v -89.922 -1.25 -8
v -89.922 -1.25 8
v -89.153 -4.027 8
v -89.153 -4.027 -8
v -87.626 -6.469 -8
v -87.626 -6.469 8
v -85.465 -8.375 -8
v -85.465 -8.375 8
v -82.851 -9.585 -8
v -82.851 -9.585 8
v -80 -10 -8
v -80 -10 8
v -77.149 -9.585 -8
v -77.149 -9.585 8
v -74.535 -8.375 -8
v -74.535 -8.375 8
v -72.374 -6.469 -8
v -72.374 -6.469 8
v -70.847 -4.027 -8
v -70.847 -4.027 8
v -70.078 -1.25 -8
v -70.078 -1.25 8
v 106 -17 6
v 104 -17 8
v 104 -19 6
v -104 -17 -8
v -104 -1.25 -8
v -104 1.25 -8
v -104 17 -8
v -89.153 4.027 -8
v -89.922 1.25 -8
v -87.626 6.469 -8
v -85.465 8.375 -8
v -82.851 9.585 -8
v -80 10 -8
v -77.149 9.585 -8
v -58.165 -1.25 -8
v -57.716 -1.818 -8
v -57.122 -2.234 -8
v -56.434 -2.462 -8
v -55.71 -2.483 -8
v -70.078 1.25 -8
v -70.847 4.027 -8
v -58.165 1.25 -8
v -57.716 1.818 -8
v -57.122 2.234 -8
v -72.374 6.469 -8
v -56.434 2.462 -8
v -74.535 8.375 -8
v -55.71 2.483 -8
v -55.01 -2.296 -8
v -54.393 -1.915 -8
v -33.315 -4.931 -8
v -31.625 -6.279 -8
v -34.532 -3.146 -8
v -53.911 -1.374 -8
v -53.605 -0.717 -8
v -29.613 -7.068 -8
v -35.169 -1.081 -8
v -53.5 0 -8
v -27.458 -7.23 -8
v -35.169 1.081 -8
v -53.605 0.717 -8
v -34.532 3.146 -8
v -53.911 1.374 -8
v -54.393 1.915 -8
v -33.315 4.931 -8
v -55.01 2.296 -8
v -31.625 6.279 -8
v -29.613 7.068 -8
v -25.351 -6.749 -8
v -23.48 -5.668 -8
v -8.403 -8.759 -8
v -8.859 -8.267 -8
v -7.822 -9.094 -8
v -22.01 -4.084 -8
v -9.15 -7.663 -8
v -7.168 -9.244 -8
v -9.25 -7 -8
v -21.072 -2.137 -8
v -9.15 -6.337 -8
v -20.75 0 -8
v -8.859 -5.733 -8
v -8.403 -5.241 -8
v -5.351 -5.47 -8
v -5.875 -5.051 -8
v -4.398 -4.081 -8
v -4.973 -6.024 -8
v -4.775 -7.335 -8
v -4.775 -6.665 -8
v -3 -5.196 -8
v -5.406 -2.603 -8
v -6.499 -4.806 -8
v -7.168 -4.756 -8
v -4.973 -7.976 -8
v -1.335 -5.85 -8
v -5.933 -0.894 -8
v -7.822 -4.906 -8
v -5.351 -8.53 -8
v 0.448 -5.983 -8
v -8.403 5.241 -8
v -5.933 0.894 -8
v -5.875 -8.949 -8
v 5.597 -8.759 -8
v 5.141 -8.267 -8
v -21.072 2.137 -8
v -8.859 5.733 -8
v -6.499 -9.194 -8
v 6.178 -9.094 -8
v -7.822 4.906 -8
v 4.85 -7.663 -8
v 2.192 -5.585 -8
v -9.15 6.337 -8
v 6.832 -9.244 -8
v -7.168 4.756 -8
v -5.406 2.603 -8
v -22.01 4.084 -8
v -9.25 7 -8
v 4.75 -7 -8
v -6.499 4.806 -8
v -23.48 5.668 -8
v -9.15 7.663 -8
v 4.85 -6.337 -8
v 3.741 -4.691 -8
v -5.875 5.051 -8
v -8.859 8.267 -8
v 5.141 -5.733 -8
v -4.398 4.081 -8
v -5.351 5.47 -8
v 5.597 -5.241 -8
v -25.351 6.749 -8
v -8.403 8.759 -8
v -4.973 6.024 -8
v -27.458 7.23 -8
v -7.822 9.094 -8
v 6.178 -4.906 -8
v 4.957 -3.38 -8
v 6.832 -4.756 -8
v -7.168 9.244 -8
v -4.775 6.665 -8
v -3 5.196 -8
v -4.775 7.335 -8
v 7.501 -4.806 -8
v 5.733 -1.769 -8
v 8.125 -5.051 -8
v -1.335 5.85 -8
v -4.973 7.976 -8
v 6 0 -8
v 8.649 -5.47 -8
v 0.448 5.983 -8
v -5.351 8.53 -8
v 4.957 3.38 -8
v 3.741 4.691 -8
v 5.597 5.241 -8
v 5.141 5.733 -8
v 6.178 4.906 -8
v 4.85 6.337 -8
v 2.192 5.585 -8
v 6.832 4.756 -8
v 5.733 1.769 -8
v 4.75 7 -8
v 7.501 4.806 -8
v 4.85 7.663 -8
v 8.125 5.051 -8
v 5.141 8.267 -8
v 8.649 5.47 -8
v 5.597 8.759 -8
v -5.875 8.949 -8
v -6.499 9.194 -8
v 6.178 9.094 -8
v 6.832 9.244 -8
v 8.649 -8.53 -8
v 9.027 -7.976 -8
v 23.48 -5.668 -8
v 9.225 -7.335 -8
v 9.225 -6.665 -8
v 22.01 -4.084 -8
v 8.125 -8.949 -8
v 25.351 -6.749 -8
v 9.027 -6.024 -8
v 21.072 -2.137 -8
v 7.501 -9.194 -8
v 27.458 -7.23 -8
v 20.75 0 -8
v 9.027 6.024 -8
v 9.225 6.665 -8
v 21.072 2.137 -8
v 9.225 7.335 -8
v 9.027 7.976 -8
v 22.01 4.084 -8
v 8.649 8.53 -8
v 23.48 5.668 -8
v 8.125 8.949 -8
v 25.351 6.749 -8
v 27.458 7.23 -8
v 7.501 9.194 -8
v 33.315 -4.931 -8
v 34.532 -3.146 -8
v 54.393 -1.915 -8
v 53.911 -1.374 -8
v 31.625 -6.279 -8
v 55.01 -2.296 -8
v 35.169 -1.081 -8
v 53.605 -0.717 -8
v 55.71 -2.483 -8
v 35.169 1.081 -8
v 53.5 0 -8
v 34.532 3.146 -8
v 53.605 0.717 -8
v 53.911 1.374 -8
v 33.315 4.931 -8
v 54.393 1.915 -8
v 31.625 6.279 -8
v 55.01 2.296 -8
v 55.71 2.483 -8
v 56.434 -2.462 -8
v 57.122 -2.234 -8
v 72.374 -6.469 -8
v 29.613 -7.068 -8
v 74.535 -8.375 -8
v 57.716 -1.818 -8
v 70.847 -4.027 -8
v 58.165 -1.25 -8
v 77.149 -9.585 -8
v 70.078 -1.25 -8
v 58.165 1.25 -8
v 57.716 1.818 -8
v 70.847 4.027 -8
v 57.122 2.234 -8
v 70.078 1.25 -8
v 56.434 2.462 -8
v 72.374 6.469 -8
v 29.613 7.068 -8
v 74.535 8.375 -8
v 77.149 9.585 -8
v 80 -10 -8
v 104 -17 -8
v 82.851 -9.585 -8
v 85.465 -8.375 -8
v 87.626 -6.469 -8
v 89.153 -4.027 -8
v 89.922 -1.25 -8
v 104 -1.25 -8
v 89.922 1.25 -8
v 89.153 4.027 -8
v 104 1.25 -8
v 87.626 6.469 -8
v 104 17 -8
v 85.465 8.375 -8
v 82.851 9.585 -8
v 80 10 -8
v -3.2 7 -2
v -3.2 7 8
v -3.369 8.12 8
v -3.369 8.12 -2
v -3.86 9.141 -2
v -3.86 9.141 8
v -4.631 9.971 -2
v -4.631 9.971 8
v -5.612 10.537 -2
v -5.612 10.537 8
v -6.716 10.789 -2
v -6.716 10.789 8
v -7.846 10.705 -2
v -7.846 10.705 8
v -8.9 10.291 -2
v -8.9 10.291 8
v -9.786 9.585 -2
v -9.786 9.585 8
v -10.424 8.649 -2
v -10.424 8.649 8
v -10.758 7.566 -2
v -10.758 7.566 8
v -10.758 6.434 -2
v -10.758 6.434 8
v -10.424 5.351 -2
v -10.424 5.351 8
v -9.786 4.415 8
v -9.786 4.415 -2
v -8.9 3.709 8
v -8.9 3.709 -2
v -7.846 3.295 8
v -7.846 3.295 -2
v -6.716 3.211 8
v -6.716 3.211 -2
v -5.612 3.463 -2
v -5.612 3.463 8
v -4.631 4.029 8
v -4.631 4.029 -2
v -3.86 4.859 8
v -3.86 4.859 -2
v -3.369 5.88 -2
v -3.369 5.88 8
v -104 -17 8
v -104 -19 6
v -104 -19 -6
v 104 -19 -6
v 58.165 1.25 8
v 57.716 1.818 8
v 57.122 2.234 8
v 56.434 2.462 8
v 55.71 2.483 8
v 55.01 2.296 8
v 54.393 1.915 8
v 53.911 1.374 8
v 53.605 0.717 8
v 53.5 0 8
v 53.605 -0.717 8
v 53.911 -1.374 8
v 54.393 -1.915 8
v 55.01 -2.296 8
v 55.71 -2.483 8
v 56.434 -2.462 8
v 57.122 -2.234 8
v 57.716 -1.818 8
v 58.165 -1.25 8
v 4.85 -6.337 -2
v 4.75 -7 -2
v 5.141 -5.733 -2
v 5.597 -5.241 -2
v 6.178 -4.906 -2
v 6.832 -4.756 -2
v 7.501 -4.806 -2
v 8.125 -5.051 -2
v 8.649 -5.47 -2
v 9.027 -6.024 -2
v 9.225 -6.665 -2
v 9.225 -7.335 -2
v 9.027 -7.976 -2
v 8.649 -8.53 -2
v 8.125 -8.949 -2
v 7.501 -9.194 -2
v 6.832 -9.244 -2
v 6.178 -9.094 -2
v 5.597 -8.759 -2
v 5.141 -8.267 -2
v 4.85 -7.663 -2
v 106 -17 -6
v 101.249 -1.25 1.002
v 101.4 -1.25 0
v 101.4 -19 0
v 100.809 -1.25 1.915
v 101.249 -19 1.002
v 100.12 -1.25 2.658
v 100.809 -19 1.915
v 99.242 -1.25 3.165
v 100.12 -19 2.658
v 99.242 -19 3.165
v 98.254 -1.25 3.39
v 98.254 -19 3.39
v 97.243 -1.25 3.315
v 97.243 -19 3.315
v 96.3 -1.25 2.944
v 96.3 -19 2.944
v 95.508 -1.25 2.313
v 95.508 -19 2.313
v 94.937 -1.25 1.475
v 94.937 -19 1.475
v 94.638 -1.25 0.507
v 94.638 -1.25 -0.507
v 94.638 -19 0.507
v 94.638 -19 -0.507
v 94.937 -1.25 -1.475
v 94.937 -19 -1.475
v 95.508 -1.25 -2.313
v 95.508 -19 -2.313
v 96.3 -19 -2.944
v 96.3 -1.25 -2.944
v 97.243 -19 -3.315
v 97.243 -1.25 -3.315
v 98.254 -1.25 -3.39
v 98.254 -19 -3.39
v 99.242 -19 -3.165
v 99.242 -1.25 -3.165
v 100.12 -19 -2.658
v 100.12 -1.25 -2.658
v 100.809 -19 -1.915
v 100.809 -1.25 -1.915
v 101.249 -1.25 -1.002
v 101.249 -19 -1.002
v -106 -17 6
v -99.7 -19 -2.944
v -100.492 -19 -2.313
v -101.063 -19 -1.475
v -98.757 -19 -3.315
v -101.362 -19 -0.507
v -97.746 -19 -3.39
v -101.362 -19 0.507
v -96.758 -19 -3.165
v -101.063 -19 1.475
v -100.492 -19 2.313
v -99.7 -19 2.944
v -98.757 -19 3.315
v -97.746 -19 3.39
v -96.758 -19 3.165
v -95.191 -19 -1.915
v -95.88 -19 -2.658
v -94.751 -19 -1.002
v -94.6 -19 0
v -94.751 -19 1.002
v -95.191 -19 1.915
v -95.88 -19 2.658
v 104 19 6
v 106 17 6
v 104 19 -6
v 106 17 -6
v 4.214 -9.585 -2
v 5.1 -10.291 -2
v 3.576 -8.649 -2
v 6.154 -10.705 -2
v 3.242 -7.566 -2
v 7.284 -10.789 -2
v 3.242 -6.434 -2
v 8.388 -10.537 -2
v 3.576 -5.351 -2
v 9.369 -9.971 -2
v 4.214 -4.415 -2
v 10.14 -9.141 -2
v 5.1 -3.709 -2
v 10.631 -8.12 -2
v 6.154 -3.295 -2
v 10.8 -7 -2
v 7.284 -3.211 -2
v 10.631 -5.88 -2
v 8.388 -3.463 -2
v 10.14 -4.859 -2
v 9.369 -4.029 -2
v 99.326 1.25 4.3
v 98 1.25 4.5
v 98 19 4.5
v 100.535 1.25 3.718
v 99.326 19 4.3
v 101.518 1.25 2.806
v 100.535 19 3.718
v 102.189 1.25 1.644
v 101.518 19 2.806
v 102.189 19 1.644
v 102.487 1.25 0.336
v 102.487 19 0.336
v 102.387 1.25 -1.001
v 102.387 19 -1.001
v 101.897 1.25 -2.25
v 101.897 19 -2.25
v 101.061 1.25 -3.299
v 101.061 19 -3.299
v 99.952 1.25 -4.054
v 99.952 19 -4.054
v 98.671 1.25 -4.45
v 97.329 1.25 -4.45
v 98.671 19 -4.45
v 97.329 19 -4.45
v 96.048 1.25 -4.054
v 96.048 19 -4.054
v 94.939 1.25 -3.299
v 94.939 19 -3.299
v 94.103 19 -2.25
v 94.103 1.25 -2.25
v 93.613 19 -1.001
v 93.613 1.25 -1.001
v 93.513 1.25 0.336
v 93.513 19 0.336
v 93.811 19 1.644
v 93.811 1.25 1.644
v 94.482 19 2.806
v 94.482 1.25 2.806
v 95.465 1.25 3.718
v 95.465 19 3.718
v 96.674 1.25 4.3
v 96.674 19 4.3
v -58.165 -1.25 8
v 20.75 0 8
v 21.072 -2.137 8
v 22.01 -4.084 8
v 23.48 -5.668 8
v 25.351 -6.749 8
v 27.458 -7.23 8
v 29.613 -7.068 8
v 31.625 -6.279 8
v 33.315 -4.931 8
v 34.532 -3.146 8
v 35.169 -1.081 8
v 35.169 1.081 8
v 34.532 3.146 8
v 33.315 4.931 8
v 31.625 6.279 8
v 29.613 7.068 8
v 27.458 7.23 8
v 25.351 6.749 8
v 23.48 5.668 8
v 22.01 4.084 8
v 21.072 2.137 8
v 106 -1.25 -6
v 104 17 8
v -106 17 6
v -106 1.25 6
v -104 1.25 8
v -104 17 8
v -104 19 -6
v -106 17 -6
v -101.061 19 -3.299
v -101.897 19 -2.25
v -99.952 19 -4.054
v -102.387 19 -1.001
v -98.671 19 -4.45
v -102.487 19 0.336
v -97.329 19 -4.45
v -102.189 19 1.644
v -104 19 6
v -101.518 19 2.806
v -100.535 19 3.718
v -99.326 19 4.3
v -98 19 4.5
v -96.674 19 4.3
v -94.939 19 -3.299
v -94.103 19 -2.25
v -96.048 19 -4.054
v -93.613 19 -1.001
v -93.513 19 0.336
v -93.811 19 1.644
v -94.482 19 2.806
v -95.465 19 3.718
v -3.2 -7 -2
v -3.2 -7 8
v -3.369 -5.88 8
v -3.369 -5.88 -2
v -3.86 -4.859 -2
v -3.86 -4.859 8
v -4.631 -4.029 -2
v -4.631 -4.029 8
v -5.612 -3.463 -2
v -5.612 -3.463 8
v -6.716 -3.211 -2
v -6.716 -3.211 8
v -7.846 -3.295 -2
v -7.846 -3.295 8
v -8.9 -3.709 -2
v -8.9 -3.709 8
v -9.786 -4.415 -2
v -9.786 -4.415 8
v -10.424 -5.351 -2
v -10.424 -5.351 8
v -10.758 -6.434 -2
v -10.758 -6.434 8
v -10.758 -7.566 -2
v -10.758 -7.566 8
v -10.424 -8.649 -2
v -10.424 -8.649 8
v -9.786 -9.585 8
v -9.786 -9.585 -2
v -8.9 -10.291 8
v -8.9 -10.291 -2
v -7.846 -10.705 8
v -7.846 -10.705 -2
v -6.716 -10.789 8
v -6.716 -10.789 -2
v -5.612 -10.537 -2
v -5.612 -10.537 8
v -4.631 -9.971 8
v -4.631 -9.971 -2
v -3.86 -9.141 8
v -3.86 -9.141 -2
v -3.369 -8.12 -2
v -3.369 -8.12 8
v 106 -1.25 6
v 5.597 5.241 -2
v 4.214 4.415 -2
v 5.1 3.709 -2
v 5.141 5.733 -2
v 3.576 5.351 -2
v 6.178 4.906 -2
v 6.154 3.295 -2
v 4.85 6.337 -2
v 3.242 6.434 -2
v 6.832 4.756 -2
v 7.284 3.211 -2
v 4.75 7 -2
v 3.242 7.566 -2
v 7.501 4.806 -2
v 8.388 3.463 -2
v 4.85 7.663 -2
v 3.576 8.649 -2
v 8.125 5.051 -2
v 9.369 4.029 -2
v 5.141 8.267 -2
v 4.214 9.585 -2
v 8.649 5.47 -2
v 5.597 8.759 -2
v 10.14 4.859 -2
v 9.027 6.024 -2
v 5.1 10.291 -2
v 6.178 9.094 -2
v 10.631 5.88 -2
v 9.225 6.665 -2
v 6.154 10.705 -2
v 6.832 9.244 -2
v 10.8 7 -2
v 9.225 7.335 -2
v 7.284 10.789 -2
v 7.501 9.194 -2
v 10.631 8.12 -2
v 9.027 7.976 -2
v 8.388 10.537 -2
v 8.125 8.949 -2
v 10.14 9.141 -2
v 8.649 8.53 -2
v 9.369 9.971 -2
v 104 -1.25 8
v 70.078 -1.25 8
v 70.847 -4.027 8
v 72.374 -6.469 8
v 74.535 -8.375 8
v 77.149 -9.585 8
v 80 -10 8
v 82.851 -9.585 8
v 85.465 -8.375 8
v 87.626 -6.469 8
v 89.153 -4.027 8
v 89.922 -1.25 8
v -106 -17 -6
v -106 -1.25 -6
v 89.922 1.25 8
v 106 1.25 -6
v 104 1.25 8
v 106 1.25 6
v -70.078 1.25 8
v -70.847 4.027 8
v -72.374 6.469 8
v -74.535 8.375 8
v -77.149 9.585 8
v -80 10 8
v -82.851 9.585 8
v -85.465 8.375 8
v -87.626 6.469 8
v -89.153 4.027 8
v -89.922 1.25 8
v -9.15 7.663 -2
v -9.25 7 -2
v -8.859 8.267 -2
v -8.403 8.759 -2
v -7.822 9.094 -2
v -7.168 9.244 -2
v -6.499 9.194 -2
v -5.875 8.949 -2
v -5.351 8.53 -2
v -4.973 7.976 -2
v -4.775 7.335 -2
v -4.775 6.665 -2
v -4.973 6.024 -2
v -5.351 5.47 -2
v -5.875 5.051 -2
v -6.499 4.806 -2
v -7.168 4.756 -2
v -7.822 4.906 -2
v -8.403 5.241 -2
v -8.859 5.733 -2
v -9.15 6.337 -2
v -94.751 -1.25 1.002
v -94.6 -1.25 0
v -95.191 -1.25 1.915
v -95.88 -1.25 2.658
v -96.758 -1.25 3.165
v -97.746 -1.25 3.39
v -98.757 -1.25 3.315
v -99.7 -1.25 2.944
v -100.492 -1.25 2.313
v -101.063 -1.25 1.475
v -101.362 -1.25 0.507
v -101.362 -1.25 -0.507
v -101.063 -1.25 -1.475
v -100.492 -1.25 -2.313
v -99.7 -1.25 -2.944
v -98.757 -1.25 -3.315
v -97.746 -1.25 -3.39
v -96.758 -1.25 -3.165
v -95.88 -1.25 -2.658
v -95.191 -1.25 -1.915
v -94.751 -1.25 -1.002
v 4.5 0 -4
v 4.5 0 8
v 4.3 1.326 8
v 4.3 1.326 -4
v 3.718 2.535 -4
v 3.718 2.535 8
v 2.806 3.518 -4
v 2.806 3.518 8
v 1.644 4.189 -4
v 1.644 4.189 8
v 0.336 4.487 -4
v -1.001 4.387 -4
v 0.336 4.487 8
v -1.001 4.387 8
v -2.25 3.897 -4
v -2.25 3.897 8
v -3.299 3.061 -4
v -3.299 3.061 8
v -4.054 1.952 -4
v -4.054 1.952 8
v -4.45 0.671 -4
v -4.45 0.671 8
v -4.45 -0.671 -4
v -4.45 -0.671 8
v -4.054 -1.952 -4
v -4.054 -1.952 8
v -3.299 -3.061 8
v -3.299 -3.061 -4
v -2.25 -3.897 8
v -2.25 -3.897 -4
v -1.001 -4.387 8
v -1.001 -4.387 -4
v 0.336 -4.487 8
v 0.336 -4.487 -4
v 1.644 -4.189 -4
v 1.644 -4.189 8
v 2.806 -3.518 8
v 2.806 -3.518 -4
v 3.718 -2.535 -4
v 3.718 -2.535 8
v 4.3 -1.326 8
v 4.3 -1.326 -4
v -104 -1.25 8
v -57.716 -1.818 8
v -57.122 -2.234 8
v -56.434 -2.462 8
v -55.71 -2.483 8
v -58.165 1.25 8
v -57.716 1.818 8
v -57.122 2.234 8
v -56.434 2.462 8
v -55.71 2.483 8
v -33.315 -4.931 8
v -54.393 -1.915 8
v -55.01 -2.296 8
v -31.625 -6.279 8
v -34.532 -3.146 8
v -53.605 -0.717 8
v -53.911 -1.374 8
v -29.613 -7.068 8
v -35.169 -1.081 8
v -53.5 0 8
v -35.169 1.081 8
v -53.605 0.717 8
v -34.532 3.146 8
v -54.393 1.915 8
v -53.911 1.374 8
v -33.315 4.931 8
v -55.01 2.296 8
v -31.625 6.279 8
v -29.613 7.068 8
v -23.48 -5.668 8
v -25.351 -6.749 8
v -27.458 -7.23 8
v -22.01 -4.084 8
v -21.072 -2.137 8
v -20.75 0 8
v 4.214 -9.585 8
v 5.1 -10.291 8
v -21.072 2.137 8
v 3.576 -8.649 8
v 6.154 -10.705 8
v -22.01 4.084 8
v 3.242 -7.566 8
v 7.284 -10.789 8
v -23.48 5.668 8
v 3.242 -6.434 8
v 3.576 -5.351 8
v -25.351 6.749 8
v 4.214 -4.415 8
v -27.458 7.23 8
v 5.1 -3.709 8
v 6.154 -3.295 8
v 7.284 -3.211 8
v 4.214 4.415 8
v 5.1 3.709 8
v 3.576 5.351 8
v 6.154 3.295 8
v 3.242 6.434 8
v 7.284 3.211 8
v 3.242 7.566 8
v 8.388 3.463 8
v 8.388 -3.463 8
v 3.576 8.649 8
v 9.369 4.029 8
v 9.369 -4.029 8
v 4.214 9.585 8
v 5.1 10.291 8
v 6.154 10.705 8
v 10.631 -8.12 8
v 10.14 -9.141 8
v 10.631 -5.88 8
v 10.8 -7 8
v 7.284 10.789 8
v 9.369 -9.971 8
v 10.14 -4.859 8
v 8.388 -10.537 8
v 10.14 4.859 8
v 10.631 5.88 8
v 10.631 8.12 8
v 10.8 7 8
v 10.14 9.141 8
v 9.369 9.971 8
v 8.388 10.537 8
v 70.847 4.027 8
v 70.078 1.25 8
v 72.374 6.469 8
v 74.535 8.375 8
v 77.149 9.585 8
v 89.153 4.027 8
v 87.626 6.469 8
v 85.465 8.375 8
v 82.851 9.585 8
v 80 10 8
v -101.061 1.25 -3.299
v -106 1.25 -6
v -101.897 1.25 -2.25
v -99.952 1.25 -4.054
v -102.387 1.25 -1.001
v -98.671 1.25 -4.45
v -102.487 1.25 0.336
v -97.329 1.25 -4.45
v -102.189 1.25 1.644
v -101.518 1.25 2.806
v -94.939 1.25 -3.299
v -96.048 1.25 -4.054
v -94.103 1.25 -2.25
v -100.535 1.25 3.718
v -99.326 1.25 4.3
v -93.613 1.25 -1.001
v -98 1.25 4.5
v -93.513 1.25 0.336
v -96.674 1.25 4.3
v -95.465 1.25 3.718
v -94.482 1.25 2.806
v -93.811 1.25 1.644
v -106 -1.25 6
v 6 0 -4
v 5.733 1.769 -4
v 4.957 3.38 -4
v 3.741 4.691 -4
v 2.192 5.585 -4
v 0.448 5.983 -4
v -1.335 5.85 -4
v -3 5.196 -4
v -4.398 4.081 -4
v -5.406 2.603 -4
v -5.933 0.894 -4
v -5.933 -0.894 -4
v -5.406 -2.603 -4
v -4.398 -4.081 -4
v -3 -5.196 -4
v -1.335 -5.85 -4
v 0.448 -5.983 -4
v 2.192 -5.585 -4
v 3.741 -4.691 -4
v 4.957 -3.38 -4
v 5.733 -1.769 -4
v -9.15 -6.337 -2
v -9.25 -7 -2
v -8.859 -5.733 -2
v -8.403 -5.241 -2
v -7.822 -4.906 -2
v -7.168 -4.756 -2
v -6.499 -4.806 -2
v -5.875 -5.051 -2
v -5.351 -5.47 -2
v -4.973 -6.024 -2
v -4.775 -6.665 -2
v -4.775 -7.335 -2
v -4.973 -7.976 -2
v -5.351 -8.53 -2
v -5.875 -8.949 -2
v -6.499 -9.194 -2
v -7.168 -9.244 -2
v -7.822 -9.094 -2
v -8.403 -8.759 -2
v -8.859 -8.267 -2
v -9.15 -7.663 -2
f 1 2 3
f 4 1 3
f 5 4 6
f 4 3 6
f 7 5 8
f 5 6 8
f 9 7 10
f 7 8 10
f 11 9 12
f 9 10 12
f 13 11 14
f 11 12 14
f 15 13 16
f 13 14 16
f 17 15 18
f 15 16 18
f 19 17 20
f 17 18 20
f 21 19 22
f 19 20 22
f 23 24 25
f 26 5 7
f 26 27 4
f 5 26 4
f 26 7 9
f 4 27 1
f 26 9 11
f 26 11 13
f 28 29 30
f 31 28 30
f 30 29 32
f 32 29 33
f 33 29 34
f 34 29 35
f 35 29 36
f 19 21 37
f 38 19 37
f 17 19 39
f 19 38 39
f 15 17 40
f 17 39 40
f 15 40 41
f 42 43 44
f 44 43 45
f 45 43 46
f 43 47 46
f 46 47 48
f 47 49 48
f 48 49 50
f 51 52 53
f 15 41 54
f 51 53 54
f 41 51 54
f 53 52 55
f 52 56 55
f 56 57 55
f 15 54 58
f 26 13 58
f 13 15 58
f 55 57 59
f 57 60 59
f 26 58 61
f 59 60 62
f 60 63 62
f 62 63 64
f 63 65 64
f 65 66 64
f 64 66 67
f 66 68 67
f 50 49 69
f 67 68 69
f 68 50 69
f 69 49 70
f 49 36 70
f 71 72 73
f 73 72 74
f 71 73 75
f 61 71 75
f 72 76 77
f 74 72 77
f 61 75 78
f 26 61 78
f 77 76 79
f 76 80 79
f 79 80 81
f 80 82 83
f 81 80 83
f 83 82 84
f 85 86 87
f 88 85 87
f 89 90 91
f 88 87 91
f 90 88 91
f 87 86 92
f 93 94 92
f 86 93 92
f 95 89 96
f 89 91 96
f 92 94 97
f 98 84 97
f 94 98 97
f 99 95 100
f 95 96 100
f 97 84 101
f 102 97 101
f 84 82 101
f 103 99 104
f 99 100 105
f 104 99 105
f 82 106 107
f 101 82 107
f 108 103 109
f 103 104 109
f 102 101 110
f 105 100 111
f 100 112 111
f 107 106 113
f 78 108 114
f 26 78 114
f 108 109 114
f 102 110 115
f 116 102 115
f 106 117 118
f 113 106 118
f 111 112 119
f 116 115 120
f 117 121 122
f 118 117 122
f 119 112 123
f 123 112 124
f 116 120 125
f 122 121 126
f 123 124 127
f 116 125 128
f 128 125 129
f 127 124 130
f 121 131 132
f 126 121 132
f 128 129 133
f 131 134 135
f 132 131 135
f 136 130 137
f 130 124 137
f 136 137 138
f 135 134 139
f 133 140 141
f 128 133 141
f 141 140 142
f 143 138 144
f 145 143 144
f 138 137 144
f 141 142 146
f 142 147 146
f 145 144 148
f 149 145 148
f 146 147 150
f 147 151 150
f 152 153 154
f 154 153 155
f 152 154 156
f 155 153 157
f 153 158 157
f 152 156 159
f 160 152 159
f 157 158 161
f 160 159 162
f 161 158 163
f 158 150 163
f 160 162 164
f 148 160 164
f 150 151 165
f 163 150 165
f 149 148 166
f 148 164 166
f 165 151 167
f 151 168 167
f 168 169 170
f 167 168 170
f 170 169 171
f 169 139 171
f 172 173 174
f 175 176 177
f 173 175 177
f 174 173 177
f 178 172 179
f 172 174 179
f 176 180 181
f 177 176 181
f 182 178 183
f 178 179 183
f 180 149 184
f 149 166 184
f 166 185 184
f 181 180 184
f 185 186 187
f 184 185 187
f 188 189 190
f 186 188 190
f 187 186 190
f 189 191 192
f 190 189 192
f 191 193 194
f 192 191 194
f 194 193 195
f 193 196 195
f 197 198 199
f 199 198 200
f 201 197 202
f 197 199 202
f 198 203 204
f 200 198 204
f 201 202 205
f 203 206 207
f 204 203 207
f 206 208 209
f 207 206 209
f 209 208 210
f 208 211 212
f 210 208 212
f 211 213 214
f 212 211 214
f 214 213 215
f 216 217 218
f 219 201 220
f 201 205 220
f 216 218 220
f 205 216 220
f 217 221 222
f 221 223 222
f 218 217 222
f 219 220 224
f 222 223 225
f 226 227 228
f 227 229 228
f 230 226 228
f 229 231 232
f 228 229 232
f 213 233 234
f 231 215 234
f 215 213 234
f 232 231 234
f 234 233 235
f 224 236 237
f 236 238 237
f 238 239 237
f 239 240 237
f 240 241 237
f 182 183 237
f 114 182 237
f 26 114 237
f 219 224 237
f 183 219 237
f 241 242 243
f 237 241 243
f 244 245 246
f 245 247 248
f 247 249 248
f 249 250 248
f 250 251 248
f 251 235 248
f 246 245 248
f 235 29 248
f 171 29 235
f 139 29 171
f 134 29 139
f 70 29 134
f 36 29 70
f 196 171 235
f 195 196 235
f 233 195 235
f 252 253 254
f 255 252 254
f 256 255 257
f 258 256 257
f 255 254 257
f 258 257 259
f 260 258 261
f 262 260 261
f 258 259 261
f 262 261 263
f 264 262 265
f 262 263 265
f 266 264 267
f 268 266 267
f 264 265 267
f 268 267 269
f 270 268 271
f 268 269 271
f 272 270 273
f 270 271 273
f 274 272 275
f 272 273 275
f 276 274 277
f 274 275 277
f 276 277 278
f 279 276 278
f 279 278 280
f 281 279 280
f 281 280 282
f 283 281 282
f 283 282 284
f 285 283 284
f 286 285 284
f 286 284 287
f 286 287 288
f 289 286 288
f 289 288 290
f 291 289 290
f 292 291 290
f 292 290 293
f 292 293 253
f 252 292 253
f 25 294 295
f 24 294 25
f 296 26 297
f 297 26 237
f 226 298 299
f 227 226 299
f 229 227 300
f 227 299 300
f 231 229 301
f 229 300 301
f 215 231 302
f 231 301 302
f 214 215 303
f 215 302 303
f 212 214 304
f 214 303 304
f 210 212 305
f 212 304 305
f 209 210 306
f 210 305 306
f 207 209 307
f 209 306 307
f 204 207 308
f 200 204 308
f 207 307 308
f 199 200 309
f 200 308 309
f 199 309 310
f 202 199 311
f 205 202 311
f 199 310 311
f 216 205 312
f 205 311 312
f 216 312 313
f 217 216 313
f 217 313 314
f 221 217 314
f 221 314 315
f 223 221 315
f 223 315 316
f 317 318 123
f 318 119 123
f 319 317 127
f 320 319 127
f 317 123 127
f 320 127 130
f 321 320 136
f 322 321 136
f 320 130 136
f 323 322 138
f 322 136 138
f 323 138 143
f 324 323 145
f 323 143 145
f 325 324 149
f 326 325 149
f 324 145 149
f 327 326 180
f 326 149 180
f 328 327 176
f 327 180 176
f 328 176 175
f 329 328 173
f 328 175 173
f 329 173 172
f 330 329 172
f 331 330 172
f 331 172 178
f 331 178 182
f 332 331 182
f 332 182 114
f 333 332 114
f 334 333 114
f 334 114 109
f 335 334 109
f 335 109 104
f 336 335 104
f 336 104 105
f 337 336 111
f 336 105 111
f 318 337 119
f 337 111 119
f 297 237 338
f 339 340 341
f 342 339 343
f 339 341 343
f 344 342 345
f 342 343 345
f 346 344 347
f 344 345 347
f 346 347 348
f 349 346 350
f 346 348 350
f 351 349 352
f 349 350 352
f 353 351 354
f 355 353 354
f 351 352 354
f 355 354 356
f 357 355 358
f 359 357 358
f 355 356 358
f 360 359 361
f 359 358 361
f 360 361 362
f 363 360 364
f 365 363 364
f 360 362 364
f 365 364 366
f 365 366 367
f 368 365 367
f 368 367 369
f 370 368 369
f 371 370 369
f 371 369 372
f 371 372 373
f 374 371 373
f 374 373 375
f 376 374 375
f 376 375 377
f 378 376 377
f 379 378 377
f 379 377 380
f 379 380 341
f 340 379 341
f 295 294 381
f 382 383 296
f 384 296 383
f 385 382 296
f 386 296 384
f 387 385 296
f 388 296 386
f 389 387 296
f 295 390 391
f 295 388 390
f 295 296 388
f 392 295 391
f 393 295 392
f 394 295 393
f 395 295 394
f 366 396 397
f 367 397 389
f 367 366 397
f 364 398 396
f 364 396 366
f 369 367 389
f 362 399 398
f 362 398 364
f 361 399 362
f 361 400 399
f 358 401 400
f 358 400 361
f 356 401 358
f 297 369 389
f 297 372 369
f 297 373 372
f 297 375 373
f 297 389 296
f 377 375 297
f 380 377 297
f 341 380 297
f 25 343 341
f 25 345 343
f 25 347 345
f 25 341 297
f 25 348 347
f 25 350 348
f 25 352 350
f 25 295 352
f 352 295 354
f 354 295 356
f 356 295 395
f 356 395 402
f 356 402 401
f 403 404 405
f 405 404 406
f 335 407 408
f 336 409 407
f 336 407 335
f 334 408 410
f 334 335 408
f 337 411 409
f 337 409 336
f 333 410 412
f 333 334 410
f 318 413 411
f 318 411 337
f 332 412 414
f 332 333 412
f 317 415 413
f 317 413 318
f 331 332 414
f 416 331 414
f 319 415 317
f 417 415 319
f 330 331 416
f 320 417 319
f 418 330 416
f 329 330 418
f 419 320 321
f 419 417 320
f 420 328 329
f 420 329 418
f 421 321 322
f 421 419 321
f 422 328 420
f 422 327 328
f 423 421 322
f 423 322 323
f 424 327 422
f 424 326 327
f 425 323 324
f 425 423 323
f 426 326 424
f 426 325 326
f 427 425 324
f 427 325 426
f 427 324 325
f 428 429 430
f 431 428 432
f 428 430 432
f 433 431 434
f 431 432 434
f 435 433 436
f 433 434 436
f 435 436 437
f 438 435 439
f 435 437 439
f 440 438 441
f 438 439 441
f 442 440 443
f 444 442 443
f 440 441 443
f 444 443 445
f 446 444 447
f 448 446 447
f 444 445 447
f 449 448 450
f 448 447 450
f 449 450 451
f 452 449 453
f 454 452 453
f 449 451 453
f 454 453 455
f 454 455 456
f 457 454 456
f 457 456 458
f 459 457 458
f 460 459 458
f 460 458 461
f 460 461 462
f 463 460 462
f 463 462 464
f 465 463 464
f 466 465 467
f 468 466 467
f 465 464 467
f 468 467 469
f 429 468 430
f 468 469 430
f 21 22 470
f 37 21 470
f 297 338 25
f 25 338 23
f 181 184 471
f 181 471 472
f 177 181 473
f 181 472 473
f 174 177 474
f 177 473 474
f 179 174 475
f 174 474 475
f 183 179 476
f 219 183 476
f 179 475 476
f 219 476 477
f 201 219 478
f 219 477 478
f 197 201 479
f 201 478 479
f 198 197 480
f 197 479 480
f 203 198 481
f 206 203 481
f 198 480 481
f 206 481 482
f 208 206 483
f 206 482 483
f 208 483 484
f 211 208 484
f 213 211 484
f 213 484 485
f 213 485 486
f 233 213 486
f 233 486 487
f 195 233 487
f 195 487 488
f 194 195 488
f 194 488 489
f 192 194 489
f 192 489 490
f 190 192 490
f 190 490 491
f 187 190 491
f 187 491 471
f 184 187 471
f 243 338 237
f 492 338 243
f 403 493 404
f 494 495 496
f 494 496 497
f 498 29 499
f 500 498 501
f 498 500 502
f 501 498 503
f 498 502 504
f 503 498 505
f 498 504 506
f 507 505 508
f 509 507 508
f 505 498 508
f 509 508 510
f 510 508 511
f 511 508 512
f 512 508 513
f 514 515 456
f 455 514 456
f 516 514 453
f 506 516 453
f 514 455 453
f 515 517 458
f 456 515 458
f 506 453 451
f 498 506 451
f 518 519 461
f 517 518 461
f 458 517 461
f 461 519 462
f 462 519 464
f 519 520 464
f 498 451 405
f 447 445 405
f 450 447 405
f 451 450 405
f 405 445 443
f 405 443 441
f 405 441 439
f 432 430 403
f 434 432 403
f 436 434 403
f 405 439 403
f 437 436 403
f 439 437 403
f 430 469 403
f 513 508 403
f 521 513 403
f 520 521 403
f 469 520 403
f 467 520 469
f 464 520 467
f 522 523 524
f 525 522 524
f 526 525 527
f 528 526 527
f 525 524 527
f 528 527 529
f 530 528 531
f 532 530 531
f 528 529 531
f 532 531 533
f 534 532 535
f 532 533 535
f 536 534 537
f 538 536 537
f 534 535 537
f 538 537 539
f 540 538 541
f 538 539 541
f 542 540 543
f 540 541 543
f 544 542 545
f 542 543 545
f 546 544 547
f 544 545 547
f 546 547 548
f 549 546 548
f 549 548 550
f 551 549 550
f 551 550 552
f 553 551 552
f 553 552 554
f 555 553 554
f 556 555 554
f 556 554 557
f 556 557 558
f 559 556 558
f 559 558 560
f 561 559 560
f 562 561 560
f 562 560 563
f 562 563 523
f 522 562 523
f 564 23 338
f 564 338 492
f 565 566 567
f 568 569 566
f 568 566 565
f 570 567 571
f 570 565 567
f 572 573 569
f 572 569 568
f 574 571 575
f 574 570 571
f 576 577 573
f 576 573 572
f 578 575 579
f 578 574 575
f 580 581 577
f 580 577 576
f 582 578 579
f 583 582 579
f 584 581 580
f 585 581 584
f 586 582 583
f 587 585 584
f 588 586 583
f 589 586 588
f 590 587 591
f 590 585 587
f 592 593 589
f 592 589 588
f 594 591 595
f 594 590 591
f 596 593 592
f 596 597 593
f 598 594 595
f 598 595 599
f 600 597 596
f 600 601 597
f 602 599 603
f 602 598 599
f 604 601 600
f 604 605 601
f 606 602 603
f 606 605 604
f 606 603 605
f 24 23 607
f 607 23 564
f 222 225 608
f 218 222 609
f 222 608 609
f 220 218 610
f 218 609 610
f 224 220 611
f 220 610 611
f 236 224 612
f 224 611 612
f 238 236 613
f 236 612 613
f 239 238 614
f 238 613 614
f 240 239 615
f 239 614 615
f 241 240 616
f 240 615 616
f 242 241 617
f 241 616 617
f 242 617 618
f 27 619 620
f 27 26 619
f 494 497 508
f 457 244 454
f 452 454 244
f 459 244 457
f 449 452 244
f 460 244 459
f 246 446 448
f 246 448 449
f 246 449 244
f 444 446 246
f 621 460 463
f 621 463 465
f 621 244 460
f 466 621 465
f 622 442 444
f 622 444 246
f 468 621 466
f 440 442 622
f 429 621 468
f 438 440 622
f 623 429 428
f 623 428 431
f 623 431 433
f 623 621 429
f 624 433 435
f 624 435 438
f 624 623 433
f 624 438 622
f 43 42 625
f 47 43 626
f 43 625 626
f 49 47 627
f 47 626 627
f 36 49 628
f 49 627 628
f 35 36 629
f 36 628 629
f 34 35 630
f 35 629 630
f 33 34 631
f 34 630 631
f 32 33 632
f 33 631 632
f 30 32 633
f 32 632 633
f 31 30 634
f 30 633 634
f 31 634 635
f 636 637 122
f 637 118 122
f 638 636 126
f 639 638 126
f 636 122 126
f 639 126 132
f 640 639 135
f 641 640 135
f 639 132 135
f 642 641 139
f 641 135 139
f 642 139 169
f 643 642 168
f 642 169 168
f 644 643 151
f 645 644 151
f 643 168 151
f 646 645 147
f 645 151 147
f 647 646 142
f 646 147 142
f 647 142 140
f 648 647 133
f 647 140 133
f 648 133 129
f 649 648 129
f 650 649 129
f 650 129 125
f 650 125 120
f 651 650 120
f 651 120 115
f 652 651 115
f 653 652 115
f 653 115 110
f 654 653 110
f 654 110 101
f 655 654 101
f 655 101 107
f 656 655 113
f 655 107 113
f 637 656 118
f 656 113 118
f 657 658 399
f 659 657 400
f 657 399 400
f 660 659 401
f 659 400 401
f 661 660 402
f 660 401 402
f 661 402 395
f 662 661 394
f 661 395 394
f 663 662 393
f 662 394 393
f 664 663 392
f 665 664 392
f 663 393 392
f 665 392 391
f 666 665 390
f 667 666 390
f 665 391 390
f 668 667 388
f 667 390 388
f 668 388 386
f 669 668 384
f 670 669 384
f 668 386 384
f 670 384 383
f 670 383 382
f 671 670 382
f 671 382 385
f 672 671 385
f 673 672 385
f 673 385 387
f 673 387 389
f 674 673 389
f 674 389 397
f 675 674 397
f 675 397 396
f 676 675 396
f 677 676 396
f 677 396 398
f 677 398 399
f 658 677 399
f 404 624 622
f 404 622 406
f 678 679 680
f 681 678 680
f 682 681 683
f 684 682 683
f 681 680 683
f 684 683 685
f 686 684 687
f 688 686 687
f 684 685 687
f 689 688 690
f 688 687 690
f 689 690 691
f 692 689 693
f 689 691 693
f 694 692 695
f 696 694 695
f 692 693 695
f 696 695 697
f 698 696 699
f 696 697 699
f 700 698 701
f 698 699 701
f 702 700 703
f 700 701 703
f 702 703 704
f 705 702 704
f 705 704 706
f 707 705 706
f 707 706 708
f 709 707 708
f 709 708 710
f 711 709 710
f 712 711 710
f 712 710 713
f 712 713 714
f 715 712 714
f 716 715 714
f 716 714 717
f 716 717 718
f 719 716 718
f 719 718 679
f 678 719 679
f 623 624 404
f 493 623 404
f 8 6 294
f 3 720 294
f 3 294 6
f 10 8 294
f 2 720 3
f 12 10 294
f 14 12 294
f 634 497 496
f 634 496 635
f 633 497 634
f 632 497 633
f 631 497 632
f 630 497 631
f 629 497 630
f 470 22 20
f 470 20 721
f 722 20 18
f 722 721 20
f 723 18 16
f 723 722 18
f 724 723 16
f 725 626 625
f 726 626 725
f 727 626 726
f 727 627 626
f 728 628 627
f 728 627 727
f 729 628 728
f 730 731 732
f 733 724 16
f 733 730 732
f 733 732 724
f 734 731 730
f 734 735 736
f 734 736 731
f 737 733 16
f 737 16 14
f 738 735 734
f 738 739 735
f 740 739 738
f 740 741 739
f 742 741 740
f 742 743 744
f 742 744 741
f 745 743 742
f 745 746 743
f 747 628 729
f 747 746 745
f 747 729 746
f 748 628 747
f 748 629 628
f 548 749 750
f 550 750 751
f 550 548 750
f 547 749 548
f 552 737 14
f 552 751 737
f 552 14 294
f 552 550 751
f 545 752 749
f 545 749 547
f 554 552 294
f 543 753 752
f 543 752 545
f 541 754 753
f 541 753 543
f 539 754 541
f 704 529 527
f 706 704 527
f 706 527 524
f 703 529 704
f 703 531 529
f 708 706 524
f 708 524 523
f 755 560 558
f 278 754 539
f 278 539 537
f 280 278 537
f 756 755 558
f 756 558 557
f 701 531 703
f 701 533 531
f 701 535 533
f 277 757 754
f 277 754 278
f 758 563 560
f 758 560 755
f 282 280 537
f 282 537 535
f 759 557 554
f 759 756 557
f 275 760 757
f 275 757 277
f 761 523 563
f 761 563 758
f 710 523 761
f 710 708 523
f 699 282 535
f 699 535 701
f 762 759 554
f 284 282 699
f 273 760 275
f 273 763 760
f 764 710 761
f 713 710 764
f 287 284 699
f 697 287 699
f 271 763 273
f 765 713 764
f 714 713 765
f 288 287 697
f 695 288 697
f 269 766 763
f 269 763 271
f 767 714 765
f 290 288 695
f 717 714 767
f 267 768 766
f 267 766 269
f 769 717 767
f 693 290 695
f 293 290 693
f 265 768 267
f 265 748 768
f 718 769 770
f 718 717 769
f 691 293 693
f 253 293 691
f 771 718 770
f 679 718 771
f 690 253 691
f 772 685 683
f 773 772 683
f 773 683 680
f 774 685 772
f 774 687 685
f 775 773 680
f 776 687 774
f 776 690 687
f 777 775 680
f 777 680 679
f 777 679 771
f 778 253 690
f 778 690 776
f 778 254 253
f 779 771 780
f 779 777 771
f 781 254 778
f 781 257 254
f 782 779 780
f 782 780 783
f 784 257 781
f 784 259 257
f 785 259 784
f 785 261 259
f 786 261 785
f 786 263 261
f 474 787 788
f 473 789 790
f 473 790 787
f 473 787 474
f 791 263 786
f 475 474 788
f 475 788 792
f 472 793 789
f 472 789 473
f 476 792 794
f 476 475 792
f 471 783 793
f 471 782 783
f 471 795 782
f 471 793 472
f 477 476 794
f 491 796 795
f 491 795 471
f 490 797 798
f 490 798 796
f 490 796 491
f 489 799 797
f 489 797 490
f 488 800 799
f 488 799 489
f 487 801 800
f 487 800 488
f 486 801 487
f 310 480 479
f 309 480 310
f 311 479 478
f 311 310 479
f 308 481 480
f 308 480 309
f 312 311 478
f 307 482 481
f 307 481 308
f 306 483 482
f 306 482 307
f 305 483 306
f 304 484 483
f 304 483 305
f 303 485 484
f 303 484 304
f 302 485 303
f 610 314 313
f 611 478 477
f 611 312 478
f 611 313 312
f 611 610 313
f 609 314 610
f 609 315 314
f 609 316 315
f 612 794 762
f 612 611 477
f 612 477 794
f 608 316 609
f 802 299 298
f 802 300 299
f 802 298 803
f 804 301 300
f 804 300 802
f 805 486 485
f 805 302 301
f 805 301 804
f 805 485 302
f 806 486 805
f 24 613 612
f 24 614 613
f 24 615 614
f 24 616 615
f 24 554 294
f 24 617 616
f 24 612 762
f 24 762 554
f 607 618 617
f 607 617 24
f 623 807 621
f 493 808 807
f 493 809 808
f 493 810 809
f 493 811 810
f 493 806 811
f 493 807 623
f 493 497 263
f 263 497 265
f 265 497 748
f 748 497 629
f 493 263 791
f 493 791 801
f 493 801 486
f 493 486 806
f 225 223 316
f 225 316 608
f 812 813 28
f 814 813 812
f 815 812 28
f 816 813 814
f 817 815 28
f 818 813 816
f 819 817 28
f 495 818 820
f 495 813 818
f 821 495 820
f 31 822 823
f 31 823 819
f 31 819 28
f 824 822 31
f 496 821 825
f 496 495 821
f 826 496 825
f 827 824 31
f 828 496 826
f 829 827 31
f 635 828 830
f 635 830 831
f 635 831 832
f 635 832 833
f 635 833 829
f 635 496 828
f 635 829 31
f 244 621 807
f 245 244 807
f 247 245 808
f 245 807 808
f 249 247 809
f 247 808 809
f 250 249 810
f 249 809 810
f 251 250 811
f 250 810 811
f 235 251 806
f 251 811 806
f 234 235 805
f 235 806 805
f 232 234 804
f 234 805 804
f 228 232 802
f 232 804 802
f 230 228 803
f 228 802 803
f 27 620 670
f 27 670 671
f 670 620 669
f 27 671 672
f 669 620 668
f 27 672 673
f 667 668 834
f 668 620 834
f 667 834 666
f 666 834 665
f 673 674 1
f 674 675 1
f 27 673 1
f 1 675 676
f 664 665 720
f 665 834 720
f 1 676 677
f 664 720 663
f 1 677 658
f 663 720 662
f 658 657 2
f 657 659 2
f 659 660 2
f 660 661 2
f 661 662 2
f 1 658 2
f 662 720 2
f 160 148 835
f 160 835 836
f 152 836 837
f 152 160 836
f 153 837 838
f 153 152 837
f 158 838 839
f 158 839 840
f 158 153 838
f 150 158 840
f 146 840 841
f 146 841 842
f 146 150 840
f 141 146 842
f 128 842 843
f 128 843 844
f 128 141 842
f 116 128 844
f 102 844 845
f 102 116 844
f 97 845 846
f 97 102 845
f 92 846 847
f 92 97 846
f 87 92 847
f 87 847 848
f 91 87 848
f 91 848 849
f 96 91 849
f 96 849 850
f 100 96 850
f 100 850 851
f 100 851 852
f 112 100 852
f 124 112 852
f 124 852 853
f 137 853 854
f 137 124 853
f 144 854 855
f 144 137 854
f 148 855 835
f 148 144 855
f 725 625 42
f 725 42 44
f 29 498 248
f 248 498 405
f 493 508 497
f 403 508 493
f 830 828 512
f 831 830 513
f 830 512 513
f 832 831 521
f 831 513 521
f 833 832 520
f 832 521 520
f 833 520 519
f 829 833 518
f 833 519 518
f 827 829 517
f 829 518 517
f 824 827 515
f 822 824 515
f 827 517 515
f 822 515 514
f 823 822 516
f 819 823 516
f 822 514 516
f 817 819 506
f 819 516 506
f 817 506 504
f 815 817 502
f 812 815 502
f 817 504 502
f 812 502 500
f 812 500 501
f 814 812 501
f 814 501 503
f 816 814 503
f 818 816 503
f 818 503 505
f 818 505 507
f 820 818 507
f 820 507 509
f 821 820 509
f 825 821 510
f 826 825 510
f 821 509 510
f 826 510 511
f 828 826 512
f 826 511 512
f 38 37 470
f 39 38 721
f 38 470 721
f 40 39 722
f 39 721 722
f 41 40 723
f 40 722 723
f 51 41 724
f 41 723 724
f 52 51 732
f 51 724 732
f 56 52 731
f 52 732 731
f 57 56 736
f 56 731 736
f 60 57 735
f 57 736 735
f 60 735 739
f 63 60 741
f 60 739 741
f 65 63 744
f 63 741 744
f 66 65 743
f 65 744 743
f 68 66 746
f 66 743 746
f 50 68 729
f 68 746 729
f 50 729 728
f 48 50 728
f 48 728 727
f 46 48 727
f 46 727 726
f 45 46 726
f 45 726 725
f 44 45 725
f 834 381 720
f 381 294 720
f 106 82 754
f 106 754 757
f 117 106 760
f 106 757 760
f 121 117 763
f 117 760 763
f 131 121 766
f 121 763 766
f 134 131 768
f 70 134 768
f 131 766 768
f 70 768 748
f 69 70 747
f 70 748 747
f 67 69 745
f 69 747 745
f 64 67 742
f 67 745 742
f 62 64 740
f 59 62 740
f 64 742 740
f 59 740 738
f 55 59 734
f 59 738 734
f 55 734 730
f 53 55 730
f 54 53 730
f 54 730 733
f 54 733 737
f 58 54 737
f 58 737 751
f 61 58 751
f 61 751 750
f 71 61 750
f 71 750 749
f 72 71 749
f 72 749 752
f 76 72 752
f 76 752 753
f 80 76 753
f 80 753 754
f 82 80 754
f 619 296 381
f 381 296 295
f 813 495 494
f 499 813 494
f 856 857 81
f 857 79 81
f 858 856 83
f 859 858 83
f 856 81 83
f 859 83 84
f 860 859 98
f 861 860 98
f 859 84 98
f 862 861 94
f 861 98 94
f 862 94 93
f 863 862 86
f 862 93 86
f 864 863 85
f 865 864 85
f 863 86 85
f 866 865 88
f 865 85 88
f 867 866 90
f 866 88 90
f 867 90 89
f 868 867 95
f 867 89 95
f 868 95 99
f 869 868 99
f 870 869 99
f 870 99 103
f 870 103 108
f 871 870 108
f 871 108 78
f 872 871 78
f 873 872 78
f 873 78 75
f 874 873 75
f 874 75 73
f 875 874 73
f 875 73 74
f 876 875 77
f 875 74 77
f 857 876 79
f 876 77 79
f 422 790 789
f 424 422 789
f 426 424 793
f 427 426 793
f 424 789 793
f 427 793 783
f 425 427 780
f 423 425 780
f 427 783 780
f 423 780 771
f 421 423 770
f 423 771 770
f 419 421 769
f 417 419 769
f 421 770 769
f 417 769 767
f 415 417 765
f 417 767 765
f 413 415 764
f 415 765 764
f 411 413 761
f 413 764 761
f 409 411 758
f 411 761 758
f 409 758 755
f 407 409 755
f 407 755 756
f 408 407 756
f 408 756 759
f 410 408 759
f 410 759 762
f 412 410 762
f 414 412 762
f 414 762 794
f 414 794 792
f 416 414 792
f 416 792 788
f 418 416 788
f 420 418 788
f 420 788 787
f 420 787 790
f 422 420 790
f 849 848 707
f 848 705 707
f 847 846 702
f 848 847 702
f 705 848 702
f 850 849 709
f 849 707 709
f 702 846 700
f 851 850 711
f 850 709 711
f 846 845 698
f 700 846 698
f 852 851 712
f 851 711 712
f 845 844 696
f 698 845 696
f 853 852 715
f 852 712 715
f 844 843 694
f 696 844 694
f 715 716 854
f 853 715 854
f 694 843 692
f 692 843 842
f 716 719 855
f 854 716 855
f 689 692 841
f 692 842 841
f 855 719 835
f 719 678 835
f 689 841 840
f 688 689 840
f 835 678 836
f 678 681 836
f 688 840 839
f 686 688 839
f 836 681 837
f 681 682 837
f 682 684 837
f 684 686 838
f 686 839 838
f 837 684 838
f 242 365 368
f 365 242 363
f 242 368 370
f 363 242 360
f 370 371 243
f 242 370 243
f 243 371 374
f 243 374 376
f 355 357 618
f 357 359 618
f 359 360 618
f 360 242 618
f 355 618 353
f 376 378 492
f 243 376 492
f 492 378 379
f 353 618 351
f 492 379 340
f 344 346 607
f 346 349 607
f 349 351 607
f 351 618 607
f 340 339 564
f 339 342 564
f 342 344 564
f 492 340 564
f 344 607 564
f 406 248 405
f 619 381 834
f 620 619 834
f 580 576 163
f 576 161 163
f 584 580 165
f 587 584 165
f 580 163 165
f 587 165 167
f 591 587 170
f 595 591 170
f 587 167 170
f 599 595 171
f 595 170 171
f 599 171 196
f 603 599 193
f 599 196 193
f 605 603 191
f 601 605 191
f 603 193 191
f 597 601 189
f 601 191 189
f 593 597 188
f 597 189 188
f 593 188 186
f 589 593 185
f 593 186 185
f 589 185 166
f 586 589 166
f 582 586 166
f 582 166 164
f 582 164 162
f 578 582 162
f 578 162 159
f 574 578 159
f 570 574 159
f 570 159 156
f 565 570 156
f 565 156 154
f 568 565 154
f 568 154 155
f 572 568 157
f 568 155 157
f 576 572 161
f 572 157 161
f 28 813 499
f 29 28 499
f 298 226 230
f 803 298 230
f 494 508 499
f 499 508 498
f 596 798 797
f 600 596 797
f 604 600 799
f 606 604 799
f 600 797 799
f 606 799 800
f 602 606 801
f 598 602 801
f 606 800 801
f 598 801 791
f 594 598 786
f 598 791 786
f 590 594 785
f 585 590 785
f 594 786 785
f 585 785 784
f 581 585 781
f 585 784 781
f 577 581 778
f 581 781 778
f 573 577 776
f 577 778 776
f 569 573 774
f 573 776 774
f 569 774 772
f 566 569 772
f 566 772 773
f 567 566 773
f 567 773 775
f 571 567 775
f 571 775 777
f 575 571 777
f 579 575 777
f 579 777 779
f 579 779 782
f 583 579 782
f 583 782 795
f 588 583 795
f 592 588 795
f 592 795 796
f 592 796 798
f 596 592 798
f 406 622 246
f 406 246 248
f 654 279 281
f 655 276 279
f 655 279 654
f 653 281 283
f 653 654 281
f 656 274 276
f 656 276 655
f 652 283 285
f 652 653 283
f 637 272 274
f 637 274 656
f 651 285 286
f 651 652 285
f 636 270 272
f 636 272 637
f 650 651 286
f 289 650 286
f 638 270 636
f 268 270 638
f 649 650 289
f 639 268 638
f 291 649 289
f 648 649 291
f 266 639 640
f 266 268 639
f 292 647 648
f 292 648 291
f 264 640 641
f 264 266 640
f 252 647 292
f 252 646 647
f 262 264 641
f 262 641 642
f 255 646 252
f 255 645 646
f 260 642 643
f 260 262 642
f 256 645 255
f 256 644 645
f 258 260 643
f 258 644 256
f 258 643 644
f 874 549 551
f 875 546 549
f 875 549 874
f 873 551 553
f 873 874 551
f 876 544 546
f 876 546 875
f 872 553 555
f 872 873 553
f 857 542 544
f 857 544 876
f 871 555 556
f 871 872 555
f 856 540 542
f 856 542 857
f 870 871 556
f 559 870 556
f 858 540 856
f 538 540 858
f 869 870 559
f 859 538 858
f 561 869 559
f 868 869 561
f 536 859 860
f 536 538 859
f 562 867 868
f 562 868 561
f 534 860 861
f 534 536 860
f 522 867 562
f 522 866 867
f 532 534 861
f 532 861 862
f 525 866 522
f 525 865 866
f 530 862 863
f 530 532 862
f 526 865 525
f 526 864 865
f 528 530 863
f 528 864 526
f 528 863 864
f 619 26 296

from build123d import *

# Parameters (mm, degrees)
SKETCH_1_W                = 212
SKETCH_1_H                = 38
EXTRUDE_1_DEPTH           = 8
SKETCH_2_R                = 10
CUT_EXTRUDE_1_DEPTH       = 109.87148387
SKETCH_3_W                = 50
SKETCH_3_H                = 2.5
CUT_EXTRUDE_2_DEPTH       = 109.87148387
SKETCH_4_R                = 6
CUT_EXTRUDE_3_DEPTH       = 4
SKETCH_5_R                = 4.5
CUT_EXTRUDE_4_DEPTH       = 109.87148387
HOLE_WIZARD_1_D           = 4.5
HOLE_WIZARD_1_CBORE_D     = 7.6
HOLE_WIZARD_1_CBORE_DEPTH = 10
SKETCH_8_R                = 7.25
CUT_EXTRUDE_5_DEPTH       = 109.87148387
SKETCH_9_R                = 4.5
CUT_EXTRUDE_6_DEPTH       = 17.75
M8X1_25_1_D               = 6.8
CHAMFER_1_SIZE            = 2
SKETCH_13_R               = 2.5
CUT_EXTRUDE_7_DEPTH       = 109.87148387


with BuildPart() as part:
    # 草图1 → 凸台-拉伸1 (new, symmetric)
    with BuildSketch(Plane.XY):
        Rectangle(SKETCH_1_W, SKETCH_1_H)
    extrude(amount=EXTRUDE_1_DEPTH, both=True)

    # 草图2 → 切除-拉伸1 (cut, through all)
    with BuildSketch(Plane.XY.offset(8)):
        with Locations((-80, 0)):
            Circle(SKETCH_2_R)
        with Locations(Location((80, 0, 0), (0, 0, 180))):
            Circle(SKETCH_2_R)
    extrude(amount=-CUT_EXTRUDE_1_DEPTH, mode=Mode.SUBTRACT)

    # 草图3 → 切除-拉伸2 (cut, through all)
    with BuildSketch(Plane.XY.offset(8)):
        with Locations((-81, 0)):
            Rectangle(SKETCH_3_W, SKETCH_3_H)
        with Locations((81, 0)):
            Rectangle(SKETCH_3_W, SKETCH_3_H)
    extrude(amount=-CUT_EXTRUDE_2_DEPTH, mode=Mode.SUBTRACT)

    # 草图4 → 切除-拉伸3 (cut)
    with BuildSketch(Plane.XY.offset(-8)):
        Circle(SKETCH_4_R)
    extrude(amount=CUT_EXTRUDE_3_DEPTH, mode=Mode.SUBTRACT)

    # 草图5 → 切除-拉伸4 (cut, through all)
    with BuildSketch(Plane.XY.offset(8)):
        Circle(SKETCH_5_R)
    extrude(amount=-CUT_EXTRUDE_4_DEPTH, mode=Mode.SUBTRACT)

    # 孔1 (through all)
    with Locations(Plane.XY.offset(8)):
        with Locations((-7, 7), (7, 7), (7, -7), (-7, -7)):
            CounterBoreHole(HOLE_WIZARD_1_D / 2, HOLE_WIZARD_1_CBORE_D / 2, HOLE_WIZARD_1_CBORE_DEPTH)

    # 草图8 → 切除-拉伸5 (cut, through all)
    with BuildSketch(Plane.XY.offset(8)):
        with Locations((-28, 0)):
            Circle(SKETCH_8_R)
        with Locations(Location((28, 0, 0), (0, 0, 180))):
            Circle(SKETCH_8_R)
    extrude(amount=-CUT_EXTRUDE_5_DEPTH, mode=Mode.SUBTRACT)

    # 草图9 → 切除-拉伸6 (cut)
    with BuildSketch(Plane(origin=(0, 19, 0), x_dir=(1, 0, 0), z_dir=(0, 1, 0))):
        with Locations(Location((-98, 0, 0), (0, 0, 270))):
            Circle(SKETCH_9_R)
        with Locations(Location((98, 0, 0), (0, 0, 270))):
            Circle(SKETCH_9_R)
    extrude(amount=-CUT_EXTRUDE_6_DEPTH, mode=Mode.SUBTRACT)

    # M8x1.25 螺纹孔1 (through all)
    with Locations(Plane(origin=(0, -1.25, 0), x_dir=(-1, 0, 0), z_dir=(0, 1, 0))):
        with Locations((98, 0), (-98, 0)):
            Hole(M8X1_25_1_D / 2)

    # 倒角1
    chamfer_1_edges = [part.edges().sort_by_distance(p)[0] for p in [
        (106, -10.125, 8),
        (0, 19, 8),
        (-106, -10.125, -8),
        (-106, -10.125, 8),
        (-106, 10.125, 8),
        (0, 19, -8),
        (106, -10.125, -8),
        (0, -19, -8),
        (106, 10.125, -8),
        (-106, 10.125, -8),
        (106, 10.125, 8),
        (0, -19, 8),
        (-106, 19, 0),
        (106, 19, 0),
        (106, -19, 0),
        (-106, -19, 0),
    ]]
    chamfer(chamfer_1_edges, length=CHAMFER_1_SIZE)

    # 草图13 → 切除-拉伸7 (cut, through all)
    with BuildSketch(Plane.XY.offset(8)):
        with Locations((-56, 0)):
            Circle(SKETCH_13_R)
        with Locations((56, 0)):
            Circle(SKETCH_13_R)
    extrude(amount=-CUT_EXTRUDE_7_DEPTH, mode=Mode.SUBTRACT)


solid = part.part
